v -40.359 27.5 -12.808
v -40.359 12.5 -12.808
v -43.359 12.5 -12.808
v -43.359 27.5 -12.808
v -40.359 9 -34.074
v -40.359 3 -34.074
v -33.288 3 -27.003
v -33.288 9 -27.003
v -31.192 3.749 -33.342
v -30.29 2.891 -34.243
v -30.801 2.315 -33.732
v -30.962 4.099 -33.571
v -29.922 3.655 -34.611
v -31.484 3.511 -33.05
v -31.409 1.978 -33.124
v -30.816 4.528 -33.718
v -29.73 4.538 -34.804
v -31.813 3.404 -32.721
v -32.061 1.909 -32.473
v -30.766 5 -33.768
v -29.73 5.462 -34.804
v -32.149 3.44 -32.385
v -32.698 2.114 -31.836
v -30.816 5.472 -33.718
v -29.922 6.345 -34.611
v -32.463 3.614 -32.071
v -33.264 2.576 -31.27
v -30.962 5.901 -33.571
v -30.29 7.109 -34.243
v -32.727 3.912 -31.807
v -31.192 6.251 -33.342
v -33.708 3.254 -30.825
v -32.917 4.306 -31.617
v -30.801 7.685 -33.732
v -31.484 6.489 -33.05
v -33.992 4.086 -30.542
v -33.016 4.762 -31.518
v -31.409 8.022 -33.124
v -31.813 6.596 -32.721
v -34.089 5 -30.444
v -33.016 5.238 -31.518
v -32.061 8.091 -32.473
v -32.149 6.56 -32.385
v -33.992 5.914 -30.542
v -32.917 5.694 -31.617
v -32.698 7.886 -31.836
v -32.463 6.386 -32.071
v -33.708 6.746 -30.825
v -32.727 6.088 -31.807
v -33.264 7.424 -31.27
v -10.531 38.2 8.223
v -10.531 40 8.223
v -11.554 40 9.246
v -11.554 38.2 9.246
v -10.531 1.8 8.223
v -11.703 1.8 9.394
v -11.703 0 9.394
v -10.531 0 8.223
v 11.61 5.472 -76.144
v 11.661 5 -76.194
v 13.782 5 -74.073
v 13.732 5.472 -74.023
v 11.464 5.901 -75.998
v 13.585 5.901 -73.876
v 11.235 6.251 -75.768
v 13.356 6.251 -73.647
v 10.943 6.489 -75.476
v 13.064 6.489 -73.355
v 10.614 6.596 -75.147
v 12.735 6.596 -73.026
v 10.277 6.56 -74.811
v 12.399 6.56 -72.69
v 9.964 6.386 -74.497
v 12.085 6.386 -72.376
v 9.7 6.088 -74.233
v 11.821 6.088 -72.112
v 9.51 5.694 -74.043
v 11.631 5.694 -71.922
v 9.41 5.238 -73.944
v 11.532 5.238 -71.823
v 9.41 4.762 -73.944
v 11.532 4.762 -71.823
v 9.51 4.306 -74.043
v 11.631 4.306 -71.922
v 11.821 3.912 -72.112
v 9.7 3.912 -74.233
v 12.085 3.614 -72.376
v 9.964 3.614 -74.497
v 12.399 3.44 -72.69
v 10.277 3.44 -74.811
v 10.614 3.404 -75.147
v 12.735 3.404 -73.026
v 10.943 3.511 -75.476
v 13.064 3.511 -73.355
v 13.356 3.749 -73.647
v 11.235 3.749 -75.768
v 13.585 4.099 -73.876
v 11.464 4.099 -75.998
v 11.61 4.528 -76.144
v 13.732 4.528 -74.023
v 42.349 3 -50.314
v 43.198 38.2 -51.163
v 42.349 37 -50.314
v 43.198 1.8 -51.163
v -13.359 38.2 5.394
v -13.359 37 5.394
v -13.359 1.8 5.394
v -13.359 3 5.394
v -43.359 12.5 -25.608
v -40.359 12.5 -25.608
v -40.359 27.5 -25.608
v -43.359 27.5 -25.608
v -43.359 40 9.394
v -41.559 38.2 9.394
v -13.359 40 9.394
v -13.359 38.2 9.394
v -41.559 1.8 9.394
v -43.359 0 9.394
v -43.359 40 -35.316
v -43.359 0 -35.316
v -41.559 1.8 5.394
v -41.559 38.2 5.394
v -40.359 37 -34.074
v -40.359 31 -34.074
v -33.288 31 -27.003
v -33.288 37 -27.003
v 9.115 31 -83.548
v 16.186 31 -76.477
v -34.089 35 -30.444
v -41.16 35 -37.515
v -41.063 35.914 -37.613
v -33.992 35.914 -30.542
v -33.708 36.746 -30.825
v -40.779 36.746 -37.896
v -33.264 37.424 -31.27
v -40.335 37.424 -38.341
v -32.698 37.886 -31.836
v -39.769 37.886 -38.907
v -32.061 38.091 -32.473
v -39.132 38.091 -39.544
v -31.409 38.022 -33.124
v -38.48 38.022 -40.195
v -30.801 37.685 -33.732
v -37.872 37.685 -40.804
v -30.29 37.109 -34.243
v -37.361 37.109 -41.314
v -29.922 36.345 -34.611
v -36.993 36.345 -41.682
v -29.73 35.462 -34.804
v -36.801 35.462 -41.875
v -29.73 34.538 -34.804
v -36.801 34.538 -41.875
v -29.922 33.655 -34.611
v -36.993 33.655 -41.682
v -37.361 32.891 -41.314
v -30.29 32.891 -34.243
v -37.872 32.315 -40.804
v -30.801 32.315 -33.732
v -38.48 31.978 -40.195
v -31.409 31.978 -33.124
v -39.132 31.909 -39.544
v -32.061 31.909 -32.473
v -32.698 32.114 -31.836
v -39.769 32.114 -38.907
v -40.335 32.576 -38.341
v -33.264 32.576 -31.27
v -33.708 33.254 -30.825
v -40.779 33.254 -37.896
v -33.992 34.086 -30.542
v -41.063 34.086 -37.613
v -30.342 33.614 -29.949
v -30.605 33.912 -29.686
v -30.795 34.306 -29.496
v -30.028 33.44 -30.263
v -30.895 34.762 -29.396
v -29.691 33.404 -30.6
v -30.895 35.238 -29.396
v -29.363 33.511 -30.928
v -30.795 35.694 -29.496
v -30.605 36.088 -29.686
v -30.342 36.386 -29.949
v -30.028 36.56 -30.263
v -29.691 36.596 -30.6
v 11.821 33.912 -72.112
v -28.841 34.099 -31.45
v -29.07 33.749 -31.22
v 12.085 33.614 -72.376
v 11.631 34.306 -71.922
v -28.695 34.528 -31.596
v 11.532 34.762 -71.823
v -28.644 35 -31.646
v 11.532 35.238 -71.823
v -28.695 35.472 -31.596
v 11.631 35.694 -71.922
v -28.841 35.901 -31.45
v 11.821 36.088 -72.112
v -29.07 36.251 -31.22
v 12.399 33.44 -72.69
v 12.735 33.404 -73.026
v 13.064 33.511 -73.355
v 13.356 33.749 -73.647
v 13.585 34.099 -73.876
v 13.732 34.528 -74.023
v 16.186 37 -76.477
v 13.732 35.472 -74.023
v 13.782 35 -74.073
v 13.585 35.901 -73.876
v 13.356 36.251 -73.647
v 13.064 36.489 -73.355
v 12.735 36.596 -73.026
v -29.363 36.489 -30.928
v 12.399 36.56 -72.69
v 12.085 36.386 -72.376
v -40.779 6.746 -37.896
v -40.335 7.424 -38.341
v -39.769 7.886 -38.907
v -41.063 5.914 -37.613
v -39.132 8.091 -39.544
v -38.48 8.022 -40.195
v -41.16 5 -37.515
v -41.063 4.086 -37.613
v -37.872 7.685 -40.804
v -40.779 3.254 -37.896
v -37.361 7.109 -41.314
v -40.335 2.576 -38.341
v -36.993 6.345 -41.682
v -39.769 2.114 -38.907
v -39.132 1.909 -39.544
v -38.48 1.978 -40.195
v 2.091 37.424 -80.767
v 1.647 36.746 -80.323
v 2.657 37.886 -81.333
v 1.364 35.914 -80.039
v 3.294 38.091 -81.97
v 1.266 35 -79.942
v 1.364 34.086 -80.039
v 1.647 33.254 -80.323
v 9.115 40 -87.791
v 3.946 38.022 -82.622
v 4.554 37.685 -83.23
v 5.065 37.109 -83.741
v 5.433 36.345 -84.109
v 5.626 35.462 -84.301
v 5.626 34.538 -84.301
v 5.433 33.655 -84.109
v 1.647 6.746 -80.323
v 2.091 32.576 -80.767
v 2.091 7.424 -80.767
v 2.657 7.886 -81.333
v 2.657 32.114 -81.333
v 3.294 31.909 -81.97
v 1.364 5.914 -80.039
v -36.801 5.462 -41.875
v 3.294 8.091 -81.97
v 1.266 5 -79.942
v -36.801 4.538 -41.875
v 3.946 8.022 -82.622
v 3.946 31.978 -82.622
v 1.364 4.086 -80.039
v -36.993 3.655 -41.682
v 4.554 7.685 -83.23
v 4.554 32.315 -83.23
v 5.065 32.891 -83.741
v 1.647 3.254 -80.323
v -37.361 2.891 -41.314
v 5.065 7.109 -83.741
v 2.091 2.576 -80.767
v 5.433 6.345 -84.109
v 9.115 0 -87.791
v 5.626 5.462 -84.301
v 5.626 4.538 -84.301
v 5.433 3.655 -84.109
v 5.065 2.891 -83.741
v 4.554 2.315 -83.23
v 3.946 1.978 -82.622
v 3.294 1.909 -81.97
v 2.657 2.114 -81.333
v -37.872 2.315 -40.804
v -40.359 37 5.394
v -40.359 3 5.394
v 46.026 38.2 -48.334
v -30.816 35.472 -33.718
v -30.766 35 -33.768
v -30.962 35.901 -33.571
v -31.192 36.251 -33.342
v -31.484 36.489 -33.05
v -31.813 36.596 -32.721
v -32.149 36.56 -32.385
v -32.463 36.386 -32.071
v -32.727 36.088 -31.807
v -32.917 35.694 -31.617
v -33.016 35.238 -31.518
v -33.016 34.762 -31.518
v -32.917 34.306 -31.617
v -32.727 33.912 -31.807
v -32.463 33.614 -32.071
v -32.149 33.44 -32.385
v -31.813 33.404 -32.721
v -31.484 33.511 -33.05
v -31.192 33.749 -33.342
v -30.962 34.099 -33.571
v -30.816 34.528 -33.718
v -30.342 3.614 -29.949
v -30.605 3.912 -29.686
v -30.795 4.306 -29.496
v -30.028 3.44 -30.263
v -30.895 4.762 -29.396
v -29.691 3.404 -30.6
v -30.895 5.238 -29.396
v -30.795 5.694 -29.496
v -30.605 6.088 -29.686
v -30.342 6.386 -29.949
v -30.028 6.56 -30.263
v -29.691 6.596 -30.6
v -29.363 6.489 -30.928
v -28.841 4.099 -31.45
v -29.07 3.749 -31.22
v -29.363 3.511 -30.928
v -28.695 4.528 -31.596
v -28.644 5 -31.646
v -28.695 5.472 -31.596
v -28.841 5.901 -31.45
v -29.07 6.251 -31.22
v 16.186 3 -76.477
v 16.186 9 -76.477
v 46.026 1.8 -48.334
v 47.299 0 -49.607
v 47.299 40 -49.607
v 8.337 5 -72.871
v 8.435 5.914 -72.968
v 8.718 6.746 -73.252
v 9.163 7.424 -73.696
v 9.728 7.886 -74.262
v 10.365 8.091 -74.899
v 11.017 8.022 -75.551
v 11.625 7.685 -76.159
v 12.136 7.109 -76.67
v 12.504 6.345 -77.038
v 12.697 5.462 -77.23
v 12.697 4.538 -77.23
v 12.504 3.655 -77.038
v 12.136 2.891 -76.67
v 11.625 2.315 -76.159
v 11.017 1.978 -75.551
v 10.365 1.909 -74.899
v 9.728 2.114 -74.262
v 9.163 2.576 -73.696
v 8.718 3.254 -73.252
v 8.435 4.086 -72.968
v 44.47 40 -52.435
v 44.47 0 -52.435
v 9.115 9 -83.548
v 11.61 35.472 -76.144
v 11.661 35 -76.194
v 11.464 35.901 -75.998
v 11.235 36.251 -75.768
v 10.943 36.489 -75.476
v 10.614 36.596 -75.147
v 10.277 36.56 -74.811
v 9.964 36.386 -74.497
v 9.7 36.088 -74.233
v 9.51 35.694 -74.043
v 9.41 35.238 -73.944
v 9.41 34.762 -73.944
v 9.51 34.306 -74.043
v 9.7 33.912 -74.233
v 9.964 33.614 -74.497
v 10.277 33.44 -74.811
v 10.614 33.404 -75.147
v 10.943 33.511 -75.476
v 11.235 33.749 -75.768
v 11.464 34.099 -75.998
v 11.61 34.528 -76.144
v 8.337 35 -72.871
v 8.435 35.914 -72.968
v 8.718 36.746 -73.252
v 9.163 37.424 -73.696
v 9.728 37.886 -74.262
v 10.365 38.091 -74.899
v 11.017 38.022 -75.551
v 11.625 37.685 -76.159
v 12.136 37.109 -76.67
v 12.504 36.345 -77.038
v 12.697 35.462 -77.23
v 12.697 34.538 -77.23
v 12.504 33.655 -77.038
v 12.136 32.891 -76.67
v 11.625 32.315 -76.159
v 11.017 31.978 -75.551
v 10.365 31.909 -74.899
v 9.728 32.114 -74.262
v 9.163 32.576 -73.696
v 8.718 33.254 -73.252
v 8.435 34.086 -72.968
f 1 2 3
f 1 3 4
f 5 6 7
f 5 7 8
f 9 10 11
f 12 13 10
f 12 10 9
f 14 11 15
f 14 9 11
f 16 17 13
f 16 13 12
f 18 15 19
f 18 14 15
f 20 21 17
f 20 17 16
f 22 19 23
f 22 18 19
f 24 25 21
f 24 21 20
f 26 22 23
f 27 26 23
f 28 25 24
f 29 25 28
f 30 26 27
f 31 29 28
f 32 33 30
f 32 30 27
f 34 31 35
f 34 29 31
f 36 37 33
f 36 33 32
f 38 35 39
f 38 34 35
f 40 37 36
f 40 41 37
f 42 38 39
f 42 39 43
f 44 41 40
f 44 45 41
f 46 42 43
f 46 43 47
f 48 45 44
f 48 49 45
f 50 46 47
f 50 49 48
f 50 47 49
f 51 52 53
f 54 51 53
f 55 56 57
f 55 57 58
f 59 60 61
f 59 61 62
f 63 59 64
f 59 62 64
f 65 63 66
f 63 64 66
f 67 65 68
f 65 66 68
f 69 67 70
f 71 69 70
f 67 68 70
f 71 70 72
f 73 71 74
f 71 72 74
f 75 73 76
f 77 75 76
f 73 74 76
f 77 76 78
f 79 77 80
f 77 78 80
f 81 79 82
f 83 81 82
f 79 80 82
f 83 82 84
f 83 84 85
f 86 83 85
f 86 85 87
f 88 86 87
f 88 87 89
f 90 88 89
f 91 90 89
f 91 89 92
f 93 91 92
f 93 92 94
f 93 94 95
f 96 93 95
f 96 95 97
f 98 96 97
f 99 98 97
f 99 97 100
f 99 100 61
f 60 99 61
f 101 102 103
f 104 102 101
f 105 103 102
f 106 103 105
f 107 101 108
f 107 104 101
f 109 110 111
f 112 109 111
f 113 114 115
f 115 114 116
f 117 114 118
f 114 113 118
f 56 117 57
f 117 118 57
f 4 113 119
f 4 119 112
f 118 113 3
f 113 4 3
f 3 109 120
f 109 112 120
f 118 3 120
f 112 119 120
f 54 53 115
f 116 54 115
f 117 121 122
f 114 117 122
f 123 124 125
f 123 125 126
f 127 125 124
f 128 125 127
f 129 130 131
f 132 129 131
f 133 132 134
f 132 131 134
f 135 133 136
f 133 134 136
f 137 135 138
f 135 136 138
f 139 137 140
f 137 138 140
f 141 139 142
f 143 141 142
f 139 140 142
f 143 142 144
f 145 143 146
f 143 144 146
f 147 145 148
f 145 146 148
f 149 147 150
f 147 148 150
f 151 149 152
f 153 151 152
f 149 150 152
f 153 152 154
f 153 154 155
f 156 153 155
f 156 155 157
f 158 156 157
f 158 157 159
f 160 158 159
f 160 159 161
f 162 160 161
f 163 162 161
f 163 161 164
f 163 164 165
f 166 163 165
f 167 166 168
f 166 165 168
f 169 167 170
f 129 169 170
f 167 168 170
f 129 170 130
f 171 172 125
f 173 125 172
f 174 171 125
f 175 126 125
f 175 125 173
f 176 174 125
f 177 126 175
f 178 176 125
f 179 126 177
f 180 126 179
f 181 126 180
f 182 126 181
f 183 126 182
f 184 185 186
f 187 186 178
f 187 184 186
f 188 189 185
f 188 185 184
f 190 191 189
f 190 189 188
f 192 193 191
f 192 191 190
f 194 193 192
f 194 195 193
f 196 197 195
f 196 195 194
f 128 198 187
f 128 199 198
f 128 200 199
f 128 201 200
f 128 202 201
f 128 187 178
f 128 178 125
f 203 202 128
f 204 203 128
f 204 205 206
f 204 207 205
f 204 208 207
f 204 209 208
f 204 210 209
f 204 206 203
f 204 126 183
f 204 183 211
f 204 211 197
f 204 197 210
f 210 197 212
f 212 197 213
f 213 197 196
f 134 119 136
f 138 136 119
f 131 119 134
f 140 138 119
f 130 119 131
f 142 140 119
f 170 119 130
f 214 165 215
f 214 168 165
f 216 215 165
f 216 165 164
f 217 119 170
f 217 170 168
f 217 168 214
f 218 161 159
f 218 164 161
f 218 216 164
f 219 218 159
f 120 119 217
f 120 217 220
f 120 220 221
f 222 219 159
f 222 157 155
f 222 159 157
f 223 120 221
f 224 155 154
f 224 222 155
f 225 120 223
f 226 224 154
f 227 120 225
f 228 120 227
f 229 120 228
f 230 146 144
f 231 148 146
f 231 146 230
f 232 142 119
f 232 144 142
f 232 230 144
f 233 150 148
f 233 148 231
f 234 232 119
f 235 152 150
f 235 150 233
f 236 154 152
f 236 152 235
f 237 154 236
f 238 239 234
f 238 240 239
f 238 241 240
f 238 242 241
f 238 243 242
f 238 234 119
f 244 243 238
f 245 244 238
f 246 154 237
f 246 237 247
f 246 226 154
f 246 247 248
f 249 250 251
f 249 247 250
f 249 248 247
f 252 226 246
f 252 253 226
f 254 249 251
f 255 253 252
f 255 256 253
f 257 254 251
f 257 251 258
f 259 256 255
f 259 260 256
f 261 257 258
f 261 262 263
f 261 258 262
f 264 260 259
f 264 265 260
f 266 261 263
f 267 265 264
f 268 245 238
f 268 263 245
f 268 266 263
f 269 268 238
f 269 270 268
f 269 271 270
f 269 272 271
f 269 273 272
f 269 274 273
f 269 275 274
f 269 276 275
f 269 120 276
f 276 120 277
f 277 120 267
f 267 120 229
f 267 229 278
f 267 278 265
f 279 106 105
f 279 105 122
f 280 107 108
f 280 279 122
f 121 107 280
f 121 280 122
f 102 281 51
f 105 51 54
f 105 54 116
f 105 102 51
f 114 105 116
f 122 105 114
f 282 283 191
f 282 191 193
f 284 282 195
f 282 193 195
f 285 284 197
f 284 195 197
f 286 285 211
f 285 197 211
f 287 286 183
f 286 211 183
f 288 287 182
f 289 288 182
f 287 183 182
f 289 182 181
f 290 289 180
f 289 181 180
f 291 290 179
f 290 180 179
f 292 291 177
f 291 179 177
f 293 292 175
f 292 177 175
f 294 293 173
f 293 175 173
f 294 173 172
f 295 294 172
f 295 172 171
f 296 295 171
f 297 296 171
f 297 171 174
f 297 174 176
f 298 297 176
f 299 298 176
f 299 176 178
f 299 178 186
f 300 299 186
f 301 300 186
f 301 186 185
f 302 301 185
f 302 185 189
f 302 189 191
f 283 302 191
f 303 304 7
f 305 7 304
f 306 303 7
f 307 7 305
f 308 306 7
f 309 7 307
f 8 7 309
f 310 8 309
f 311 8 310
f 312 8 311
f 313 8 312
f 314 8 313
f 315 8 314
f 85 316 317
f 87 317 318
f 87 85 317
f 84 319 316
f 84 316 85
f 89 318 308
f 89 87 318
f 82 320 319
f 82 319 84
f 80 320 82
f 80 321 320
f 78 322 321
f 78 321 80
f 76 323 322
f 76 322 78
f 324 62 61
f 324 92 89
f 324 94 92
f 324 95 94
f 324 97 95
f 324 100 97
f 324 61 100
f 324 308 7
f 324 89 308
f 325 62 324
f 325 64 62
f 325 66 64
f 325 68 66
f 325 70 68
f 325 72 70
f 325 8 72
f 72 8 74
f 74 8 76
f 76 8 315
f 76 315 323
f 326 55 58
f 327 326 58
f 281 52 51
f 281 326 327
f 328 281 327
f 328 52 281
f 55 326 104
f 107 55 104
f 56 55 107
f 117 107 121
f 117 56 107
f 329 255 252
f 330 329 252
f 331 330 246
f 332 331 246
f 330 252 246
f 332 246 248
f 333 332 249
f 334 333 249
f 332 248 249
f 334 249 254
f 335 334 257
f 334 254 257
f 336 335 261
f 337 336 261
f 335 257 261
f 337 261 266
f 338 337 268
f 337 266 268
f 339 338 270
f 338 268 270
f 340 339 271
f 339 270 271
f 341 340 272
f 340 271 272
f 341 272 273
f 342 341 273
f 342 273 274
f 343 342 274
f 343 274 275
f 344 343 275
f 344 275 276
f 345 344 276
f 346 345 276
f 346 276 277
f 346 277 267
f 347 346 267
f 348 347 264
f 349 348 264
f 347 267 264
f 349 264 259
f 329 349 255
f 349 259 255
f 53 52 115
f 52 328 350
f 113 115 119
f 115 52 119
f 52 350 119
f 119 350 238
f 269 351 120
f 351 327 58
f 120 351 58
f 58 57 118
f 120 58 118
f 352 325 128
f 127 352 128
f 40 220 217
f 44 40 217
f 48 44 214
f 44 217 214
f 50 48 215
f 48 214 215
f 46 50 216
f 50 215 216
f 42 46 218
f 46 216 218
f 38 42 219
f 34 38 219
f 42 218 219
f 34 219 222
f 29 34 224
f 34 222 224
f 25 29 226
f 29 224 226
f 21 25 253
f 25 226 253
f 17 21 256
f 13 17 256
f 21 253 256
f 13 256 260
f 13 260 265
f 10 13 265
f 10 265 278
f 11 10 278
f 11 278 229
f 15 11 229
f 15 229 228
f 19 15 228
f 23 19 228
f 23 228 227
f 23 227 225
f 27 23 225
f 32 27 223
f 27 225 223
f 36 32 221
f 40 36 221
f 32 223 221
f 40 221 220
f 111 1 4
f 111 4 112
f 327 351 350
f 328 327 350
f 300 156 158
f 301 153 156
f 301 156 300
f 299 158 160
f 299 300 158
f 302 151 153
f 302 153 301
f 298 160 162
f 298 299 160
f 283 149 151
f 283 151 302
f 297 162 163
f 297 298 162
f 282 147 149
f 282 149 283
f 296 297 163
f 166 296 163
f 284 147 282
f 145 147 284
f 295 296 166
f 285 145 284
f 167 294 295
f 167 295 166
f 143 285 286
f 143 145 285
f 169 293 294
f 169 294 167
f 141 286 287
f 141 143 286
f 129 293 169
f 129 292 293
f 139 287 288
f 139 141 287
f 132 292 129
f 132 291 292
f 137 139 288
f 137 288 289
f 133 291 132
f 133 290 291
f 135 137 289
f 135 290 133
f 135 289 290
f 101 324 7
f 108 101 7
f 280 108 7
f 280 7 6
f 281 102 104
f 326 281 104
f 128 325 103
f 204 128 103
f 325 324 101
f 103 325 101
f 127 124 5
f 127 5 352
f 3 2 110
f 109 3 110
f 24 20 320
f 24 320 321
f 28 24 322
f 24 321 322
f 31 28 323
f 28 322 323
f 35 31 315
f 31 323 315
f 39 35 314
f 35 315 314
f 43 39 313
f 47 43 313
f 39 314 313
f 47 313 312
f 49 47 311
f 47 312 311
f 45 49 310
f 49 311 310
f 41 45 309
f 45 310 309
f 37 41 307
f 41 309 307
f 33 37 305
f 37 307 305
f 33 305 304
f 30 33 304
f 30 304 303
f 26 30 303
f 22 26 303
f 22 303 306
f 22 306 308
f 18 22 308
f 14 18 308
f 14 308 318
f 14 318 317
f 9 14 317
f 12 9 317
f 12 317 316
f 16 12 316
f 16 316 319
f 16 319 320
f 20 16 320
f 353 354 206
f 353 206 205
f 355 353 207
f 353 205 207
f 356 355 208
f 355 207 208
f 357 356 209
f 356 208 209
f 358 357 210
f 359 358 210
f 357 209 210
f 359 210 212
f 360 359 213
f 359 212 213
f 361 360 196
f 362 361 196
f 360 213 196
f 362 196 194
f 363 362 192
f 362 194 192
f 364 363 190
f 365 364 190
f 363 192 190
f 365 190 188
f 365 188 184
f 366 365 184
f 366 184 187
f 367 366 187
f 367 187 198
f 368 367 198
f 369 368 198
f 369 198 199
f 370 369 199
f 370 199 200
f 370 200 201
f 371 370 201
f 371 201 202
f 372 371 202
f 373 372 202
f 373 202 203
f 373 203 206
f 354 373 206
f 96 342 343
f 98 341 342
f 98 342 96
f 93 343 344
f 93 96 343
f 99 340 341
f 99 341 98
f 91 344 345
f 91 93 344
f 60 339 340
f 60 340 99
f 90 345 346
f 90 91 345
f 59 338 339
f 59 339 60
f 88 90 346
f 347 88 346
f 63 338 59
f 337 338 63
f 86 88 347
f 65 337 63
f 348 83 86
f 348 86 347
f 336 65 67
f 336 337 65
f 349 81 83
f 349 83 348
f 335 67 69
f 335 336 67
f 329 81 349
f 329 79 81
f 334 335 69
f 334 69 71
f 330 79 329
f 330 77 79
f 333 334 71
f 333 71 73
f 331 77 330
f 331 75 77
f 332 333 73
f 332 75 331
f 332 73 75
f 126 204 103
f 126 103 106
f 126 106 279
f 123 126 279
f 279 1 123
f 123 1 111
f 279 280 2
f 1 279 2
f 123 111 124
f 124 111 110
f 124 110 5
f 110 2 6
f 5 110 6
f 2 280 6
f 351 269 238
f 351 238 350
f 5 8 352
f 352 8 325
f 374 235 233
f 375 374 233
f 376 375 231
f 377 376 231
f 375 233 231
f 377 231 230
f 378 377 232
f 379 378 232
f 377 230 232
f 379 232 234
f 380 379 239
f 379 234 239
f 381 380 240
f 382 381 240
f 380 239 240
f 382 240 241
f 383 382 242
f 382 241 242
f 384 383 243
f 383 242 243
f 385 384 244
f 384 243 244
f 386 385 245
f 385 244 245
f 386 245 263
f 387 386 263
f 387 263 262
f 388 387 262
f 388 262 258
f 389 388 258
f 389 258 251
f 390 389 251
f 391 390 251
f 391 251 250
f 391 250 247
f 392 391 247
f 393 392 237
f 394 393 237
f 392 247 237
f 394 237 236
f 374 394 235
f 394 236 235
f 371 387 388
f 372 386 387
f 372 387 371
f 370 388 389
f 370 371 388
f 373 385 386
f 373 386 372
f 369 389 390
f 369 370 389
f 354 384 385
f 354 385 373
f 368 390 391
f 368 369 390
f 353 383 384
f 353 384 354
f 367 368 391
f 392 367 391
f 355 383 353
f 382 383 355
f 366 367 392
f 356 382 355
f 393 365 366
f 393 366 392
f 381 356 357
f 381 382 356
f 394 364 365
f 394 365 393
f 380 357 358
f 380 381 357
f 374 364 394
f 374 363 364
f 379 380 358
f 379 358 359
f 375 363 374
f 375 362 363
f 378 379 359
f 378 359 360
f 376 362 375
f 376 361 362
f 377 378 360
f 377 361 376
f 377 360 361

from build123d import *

# Parameters (mm, degrees)
BOSS_EXTRUDE1_DEPTH = 40
SHELL1_T            = -3
BOSS_EXTRUDE2_DEPTH = 4
BOSS_EXTRUDE3_DEPTH = 4
BOSS_EXTRUDE4_DEPTH = 1.8
BOSS_EXTRUDE5_DEPTH = 1.8
SKETCH10_R          = 1.6
CUT_EXTRUDE6_DEPTH  = 107.30423742
SKETCH11_W          = 12.8
SKETCH11_H          = 15
CUT_EXTRUDE7_DEPTH  = 3
BOSS_EXTRUDE7_START = 10
SKETCH12_W          = 69.967359313
SKETCH12_H          = 34
SKETCH12_R          = 1.6
BOSS_EXTRUDE7_DEPTH = 10
SKETCH13_R          = 3.1
CUT_EXTRUDE9_DEPTH  = 10
SKETCH14_W          = 69.967359313
SKETCH14_H          = 22
CUT_EXTRUDE10_DEPTH = 10


with BuildPart() as part:
    # Sketch1 → Boss-Extrude1 (new body)
    with BuildSketch(Plane(origin=(0, 0, 0), x_dir=(1, 0, 0), z_dir=(0, 1, 0))):
        Polygon((-43.359374855, -5.394325428), (-43.359374855, 35.316352691), (9.115019377, 87.790746923), (44.470358437, 52.435407864), (-13.359374855, -5.394325428), align=None)
    extrude(amount=BOSS_EXTRUDE1_DEPTH)

    # Shell1
    shell1_openings = [part.faces().sort_by_distance(p)[0] for p in [
        (15.555491791, 20, -23.520541218),
        (-28.359374855, 20, 5.394325428),
    ]]
    offset(amount=SHELL1_T, openings=shell1_openings, kind=Kind.INTERSECTION)

    # Sketch6 → Boss-Extrude2 (add)
    with BuildSketch(Plane(origin=(-3.982524714, 0, -3.982524714), x_dir=(0.7071067811865489, 0, -0.7071067811865462), z_dir=(0.7071067811865462, 0, 0.7071067811865489))):
        Polygon((-13.260868642, 38.2), (66.722724487, 38.2), (66.722724487, 1.8), (-13.260868642, 1.8), (-13.260868642, 0), (68.522724487, 0), (68.522724487, 40), (-13.260868642, 40), align=None)
    extrude(amount=BOSS_EXTRUDE2_DEPTH)

    # Sketch7 → Boss-Extrude3 (add)
    with BuildSketch(Plane.XY.offset(5.394325428)):
        Polygon((-13.359374855, 1.8), (-41.559374855, 1.8), (-41.559374855, 38.2), (-13.359374855, 38.2), (-13.359374855, 40), (-43.359374855, 40), (-43.359374855, 0), (-13.359374855, 0), align=None)
    extrude(amount=BOSS_EXTRUDE3_DEPTH)

    # Sketch8 → Boss-Extrude4 (add)
    with BuildSketch(Plane.XZ):
        Polygon((-13.359374855, 9.394325428), (-11.702520605, 9.394325428), (-10.53094773, 8.222752552), (-13.359374855, 5.394325428), align=None)
    extrude(amount=-BOSS_EXTRUDE4_DEPTH)

    # Sketch9 → Boss-Extrude5 (add)
    with BuildSketch(Plane(origin=(0, 40, 0), x_dir=(1, 0, 0), z_dir=(0, 1, 0))):
        Polygon((-13.359374855, -5.394325428), (-10.53094773, -8.222752552), (-11.553745116, -9.245549939), (-13.359374855, -9.394325428), align=None)
    extrude(amount=-BOSS_EXTRUDE5_DEPTH)

    # Sketch10 → Cut-Extrude6 (cut, through all)
    with BuildSketch(Plane(origin=(-37.216543429, 0, -37.216543429), x_dir=(0.7071067811865488, 0, -0.7071067811865464), z_dir=(0.7071067811865464, 0, 0.7071067811865488))):
        with Locations((60.522724487, 35)):
            Circle(SKETCH10_R)
        with Locations((60.522724487, 5)):
            Circle(SKETCH10_R)
        with Locations((0.522724487, 35)):
            Circle(SKETCH10_R)
        with Locations((0.522724487, 5)):
            Circle(SKETCH10_R)
    extrude(amount=-CUT_EXTRUDE6_DEPTH, mode=Mode.SUBTRACT)

    # Sketch11 → Cut-Extrude7 (cut)
    with BuildSketch(Plane(origin=(-40.359374855, 0, 0), x_dir=(0, 0, -1), z_dir=(1, 0, 0))):
        with Locations((19.207640819, 20)):
            Rectangle(SKETCH11_W, SKETCH11_H)
    extrude(amount=-CUT_EXTRUDE7_DEPTH, mode=Mode.SUBTRACT)

    # Sketch12 → Boss-Extrude7 (add)
    with BuildSketch(Plane(origin=(-37.216543429, 0, -37.216543429), x_dir=(0.7071067811865488, 0, -0.7071067811865464), z_dir=(0.7071067811865464, 0, 0.7071067811865488)).offset(BOSS_EXTRUDE7_START)):
        with Locations((30.539044831, 20)):
            Rectangle(SKETCH12_W, SKETCH12_H)
        with Locations((0.522724487, 35)):
            Circle(SKETCH12_R, mode=Mode.SUBTRACT)
        with Locations((60.522724487, 35)):
            Circle(SKETCH12_R, mode=Mode.SUBTRACT)
        with Locations((60.522724487, 5)):
            Circle(SKETCH12_R, mode=Mode.SUBTRACT)
        with Locations((0.522724487, 5)):
            Circle(SKETCH12_R, mode=Mode.SUBTRACT)
    extrude(amount=-BOSS_EXTRUDE7_DEPTH)

    # Sketch13 → Cut-Extrude9 (cut)
    with BuildSketch(Plane(origin=(-39.337863773, 0, -39.337863773), x_dir=(-0.7071067811865488, 0, 0.7071067811865464), z_dir=(-0.7071067811865464, 0, -0.7071067811865488))):
        with Locations((-0.522724487, 35)):
            Circle(SKETCH13_R)
        with Locations((-0.522724487, 5)):
            Circle(SKETCH13_R)
        with Locations((-60.522724487, 5)):
            Circle(SKETCH13_R)
        with Locations((-60.522724487, 35)):
            Circle(SKETCH13_R)
    extrude(amount=-CUT_EXTRUDE9_DEPTH, mode=Mode.SUBTRACT)

    # Sketch14 → Cut-Extrude10 (cut)
    with BuildSketch(Plane(origin=(-30.145475617, 0, -30.145475617), x_dir=(0.7071067811865488, 0, -0.7071067811865462), z_dir=(0.7071067811865462, 0, 0.7071067811865488))):
        with Locations((30.539044831, 20)):
            Rectangle(SKETCH14_W, SKETCH14_H)
    extrude(amount=-CUT_EXTRUDE10_DEPTH, mode=Mode.SUBTRACT)


solid = part.part
